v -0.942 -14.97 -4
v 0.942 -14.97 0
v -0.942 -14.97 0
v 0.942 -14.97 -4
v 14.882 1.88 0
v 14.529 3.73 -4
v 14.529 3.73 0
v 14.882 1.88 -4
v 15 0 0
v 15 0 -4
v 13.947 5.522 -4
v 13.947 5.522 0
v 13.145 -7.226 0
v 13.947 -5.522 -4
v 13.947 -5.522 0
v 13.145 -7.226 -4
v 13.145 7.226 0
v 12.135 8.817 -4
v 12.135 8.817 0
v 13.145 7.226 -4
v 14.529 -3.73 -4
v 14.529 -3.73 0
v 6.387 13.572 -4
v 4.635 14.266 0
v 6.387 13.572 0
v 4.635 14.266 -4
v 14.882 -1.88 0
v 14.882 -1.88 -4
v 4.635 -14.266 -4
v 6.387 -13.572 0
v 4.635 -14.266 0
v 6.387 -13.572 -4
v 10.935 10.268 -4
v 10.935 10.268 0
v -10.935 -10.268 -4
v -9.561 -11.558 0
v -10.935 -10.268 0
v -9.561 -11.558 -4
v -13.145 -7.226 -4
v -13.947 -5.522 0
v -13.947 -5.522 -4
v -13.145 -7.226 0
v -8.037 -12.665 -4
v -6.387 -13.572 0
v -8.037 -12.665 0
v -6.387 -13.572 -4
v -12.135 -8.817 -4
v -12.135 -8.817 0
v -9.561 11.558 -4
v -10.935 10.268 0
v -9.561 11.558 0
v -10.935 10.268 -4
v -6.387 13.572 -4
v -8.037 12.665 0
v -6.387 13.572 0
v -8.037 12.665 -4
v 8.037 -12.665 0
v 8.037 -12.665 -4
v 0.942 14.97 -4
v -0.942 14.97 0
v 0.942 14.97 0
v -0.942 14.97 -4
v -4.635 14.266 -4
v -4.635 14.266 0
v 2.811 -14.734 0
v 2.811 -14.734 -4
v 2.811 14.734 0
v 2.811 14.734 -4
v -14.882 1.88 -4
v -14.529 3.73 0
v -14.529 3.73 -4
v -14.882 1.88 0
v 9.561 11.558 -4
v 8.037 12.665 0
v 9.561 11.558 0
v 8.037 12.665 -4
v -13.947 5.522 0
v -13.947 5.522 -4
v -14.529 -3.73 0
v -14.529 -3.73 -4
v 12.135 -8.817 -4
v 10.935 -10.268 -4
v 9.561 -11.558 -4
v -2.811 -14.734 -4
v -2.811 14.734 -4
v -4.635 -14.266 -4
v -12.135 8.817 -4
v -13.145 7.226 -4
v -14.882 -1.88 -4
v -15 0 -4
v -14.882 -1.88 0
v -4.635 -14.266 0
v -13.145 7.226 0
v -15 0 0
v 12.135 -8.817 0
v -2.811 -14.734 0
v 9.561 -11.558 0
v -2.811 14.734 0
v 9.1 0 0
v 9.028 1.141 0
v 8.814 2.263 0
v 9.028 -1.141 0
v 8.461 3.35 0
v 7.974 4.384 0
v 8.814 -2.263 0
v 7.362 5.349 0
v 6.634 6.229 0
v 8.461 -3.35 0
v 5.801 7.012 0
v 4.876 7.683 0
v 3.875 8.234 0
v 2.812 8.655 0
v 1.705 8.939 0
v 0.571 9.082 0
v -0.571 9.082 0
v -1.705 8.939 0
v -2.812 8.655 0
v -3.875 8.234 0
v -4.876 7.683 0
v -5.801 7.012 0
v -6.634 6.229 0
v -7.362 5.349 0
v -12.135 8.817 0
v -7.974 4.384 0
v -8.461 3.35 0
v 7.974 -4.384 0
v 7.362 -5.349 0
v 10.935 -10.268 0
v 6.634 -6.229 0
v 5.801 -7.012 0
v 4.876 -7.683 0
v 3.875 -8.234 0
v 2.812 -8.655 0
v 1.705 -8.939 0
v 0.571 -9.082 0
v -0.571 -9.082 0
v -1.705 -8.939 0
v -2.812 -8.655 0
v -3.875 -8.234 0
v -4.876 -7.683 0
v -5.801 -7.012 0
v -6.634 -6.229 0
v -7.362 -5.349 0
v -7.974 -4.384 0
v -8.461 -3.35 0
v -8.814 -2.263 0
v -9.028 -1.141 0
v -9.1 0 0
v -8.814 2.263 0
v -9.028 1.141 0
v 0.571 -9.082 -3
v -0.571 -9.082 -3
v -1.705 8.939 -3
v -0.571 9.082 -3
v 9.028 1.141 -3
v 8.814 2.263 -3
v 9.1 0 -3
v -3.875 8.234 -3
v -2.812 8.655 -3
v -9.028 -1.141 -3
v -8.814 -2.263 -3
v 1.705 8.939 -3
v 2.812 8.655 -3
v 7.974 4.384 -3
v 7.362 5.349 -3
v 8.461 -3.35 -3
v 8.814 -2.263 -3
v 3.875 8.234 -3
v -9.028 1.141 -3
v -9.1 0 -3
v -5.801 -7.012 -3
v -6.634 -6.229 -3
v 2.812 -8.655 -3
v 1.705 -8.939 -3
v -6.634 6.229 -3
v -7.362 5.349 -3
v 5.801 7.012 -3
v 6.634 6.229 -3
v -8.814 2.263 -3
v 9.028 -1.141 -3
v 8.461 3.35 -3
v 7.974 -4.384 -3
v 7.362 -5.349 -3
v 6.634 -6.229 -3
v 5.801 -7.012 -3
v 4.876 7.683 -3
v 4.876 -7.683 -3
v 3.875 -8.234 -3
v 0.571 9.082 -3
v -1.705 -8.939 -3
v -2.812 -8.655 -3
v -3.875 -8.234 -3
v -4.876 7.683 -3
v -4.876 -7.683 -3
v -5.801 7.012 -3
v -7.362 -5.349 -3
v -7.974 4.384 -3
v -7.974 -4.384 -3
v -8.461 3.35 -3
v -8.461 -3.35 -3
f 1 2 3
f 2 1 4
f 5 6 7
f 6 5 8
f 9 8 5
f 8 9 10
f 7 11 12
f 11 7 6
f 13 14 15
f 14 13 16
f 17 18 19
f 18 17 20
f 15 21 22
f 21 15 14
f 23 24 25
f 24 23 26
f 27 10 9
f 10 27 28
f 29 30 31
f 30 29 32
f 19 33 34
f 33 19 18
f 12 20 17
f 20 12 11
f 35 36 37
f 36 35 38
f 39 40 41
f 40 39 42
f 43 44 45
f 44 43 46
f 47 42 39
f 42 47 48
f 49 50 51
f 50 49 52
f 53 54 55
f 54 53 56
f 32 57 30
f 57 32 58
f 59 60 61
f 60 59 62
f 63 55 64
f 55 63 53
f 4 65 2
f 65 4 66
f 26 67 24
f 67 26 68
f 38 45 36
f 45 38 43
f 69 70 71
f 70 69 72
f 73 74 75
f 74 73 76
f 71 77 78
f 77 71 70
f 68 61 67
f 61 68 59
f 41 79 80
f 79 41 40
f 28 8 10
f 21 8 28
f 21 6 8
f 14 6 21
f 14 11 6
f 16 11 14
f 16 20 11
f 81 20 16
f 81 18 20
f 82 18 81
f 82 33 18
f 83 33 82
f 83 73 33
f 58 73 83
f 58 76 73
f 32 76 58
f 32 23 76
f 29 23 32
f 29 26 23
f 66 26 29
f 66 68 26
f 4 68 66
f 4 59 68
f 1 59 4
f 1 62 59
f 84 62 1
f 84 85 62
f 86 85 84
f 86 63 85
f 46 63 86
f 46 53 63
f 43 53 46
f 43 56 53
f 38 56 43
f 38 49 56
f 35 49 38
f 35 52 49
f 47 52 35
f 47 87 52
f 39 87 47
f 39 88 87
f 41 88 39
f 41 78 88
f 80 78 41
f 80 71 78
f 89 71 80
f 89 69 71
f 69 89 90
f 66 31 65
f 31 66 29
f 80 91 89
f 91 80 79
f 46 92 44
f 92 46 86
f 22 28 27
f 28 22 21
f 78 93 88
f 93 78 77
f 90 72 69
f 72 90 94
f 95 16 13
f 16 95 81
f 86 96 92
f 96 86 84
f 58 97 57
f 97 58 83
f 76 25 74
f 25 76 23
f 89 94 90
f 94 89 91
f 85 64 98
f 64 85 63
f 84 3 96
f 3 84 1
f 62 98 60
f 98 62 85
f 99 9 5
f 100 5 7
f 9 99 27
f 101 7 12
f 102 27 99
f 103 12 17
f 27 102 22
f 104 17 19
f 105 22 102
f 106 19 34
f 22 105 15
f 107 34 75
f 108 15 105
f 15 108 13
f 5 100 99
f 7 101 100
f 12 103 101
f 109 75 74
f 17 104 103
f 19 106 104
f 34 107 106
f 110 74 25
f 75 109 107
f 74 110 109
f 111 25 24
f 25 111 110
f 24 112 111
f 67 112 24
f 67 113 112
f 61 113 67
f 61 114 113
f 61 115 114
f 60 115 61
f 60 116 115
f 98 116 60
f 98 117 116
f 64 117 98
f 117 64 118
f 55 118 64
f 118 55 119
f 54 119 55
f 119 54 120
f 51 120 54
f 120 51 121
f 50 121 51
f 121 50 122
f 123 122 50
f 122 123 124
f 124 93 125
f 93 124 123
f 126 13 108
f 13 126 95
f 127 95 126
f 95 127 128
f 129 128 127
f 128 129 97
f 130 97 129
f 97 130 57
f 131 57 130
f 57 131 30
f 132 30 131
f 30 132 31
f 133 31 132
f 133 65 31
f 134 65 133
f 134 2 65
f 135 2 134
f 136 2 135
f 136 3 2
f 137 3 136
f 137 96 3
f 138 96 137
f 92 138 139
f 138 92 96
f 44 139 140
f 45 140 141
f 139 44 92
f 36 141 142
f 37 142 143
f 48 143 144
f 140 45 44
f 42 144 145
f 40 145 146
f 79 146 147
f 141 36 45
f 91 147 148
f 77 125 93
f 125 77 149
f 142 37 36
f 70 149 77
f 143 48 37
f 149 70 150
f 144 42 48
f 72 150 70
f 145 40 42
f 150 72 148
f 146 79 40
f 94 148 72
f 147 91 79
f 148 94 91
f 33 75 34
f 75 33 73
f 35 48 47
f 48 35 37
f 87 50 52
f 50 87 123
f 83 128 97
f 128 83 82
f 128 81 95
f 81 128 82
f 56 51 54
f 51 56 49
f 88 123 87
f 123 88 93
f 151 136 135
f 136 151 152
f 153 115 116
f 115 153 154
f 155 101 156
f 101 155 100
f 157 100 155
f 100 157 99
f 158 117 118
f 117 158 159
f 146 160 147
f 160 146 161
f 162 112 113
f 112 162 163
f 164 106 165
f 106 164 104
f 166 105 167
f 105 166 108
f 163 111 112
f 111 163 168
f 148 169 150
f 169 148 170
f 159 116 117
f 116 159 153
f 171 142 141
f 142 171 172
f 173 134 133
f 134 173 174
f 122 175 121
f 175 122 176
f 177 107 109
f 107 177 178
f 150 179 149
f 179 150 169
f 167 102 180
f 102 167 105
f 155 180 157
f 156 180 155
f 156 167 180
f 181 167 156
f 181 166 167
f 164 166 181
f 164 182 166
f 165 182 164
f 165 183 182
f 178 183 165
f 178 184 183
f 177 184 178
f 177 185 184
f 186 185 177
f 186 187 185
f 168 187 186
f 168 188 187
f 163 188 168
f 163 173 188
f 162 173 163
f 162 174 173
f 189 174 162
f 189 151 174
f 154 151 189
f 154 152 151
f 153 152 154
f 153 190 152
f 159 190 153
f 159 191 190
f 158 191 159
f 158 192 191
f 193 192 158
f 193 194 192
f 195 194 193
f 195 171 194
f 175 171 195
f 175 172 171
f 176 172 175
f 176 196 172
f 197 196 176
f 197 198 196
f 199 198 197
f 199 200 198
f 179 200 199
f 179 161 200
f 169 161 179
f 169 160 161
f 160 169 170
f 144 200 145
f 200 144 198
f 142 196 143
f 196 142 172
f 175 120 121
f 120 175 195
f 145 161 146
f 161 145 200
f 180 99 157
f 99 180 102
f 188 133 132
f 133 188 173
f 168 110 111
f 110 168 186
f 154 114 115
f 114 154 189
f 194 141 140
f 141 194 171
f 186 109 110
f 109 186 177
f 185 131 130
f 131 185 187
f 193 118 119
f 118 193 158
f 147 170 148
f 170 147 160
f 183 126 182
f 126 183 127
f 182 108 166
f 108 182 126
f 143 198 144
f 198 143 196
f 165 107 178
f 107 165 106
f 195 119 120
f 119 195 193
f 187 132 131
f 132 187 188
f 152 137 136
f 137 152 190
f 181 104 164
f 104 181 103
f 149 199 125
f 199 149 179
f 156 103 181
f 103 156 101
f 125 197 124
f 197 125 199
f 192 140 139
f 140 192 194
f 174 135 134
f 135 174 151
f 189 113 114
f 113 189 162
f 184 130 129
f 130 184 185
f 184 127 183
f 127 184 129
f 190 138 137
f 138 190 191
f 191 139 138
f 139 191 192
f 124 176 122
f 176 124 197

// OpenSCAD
$fn = 50;


difference() {
	union() {
		translate(v = [0, 0, -4.0000000000]) {
			cylinder(h = 4, r = 15.0000000000);
		}
	}
	union() {
		#translate(v = [0, 0, -3.0000000000]) {
			cylinder(h = 3, r = 9.1000000000);
		}
	}
}
